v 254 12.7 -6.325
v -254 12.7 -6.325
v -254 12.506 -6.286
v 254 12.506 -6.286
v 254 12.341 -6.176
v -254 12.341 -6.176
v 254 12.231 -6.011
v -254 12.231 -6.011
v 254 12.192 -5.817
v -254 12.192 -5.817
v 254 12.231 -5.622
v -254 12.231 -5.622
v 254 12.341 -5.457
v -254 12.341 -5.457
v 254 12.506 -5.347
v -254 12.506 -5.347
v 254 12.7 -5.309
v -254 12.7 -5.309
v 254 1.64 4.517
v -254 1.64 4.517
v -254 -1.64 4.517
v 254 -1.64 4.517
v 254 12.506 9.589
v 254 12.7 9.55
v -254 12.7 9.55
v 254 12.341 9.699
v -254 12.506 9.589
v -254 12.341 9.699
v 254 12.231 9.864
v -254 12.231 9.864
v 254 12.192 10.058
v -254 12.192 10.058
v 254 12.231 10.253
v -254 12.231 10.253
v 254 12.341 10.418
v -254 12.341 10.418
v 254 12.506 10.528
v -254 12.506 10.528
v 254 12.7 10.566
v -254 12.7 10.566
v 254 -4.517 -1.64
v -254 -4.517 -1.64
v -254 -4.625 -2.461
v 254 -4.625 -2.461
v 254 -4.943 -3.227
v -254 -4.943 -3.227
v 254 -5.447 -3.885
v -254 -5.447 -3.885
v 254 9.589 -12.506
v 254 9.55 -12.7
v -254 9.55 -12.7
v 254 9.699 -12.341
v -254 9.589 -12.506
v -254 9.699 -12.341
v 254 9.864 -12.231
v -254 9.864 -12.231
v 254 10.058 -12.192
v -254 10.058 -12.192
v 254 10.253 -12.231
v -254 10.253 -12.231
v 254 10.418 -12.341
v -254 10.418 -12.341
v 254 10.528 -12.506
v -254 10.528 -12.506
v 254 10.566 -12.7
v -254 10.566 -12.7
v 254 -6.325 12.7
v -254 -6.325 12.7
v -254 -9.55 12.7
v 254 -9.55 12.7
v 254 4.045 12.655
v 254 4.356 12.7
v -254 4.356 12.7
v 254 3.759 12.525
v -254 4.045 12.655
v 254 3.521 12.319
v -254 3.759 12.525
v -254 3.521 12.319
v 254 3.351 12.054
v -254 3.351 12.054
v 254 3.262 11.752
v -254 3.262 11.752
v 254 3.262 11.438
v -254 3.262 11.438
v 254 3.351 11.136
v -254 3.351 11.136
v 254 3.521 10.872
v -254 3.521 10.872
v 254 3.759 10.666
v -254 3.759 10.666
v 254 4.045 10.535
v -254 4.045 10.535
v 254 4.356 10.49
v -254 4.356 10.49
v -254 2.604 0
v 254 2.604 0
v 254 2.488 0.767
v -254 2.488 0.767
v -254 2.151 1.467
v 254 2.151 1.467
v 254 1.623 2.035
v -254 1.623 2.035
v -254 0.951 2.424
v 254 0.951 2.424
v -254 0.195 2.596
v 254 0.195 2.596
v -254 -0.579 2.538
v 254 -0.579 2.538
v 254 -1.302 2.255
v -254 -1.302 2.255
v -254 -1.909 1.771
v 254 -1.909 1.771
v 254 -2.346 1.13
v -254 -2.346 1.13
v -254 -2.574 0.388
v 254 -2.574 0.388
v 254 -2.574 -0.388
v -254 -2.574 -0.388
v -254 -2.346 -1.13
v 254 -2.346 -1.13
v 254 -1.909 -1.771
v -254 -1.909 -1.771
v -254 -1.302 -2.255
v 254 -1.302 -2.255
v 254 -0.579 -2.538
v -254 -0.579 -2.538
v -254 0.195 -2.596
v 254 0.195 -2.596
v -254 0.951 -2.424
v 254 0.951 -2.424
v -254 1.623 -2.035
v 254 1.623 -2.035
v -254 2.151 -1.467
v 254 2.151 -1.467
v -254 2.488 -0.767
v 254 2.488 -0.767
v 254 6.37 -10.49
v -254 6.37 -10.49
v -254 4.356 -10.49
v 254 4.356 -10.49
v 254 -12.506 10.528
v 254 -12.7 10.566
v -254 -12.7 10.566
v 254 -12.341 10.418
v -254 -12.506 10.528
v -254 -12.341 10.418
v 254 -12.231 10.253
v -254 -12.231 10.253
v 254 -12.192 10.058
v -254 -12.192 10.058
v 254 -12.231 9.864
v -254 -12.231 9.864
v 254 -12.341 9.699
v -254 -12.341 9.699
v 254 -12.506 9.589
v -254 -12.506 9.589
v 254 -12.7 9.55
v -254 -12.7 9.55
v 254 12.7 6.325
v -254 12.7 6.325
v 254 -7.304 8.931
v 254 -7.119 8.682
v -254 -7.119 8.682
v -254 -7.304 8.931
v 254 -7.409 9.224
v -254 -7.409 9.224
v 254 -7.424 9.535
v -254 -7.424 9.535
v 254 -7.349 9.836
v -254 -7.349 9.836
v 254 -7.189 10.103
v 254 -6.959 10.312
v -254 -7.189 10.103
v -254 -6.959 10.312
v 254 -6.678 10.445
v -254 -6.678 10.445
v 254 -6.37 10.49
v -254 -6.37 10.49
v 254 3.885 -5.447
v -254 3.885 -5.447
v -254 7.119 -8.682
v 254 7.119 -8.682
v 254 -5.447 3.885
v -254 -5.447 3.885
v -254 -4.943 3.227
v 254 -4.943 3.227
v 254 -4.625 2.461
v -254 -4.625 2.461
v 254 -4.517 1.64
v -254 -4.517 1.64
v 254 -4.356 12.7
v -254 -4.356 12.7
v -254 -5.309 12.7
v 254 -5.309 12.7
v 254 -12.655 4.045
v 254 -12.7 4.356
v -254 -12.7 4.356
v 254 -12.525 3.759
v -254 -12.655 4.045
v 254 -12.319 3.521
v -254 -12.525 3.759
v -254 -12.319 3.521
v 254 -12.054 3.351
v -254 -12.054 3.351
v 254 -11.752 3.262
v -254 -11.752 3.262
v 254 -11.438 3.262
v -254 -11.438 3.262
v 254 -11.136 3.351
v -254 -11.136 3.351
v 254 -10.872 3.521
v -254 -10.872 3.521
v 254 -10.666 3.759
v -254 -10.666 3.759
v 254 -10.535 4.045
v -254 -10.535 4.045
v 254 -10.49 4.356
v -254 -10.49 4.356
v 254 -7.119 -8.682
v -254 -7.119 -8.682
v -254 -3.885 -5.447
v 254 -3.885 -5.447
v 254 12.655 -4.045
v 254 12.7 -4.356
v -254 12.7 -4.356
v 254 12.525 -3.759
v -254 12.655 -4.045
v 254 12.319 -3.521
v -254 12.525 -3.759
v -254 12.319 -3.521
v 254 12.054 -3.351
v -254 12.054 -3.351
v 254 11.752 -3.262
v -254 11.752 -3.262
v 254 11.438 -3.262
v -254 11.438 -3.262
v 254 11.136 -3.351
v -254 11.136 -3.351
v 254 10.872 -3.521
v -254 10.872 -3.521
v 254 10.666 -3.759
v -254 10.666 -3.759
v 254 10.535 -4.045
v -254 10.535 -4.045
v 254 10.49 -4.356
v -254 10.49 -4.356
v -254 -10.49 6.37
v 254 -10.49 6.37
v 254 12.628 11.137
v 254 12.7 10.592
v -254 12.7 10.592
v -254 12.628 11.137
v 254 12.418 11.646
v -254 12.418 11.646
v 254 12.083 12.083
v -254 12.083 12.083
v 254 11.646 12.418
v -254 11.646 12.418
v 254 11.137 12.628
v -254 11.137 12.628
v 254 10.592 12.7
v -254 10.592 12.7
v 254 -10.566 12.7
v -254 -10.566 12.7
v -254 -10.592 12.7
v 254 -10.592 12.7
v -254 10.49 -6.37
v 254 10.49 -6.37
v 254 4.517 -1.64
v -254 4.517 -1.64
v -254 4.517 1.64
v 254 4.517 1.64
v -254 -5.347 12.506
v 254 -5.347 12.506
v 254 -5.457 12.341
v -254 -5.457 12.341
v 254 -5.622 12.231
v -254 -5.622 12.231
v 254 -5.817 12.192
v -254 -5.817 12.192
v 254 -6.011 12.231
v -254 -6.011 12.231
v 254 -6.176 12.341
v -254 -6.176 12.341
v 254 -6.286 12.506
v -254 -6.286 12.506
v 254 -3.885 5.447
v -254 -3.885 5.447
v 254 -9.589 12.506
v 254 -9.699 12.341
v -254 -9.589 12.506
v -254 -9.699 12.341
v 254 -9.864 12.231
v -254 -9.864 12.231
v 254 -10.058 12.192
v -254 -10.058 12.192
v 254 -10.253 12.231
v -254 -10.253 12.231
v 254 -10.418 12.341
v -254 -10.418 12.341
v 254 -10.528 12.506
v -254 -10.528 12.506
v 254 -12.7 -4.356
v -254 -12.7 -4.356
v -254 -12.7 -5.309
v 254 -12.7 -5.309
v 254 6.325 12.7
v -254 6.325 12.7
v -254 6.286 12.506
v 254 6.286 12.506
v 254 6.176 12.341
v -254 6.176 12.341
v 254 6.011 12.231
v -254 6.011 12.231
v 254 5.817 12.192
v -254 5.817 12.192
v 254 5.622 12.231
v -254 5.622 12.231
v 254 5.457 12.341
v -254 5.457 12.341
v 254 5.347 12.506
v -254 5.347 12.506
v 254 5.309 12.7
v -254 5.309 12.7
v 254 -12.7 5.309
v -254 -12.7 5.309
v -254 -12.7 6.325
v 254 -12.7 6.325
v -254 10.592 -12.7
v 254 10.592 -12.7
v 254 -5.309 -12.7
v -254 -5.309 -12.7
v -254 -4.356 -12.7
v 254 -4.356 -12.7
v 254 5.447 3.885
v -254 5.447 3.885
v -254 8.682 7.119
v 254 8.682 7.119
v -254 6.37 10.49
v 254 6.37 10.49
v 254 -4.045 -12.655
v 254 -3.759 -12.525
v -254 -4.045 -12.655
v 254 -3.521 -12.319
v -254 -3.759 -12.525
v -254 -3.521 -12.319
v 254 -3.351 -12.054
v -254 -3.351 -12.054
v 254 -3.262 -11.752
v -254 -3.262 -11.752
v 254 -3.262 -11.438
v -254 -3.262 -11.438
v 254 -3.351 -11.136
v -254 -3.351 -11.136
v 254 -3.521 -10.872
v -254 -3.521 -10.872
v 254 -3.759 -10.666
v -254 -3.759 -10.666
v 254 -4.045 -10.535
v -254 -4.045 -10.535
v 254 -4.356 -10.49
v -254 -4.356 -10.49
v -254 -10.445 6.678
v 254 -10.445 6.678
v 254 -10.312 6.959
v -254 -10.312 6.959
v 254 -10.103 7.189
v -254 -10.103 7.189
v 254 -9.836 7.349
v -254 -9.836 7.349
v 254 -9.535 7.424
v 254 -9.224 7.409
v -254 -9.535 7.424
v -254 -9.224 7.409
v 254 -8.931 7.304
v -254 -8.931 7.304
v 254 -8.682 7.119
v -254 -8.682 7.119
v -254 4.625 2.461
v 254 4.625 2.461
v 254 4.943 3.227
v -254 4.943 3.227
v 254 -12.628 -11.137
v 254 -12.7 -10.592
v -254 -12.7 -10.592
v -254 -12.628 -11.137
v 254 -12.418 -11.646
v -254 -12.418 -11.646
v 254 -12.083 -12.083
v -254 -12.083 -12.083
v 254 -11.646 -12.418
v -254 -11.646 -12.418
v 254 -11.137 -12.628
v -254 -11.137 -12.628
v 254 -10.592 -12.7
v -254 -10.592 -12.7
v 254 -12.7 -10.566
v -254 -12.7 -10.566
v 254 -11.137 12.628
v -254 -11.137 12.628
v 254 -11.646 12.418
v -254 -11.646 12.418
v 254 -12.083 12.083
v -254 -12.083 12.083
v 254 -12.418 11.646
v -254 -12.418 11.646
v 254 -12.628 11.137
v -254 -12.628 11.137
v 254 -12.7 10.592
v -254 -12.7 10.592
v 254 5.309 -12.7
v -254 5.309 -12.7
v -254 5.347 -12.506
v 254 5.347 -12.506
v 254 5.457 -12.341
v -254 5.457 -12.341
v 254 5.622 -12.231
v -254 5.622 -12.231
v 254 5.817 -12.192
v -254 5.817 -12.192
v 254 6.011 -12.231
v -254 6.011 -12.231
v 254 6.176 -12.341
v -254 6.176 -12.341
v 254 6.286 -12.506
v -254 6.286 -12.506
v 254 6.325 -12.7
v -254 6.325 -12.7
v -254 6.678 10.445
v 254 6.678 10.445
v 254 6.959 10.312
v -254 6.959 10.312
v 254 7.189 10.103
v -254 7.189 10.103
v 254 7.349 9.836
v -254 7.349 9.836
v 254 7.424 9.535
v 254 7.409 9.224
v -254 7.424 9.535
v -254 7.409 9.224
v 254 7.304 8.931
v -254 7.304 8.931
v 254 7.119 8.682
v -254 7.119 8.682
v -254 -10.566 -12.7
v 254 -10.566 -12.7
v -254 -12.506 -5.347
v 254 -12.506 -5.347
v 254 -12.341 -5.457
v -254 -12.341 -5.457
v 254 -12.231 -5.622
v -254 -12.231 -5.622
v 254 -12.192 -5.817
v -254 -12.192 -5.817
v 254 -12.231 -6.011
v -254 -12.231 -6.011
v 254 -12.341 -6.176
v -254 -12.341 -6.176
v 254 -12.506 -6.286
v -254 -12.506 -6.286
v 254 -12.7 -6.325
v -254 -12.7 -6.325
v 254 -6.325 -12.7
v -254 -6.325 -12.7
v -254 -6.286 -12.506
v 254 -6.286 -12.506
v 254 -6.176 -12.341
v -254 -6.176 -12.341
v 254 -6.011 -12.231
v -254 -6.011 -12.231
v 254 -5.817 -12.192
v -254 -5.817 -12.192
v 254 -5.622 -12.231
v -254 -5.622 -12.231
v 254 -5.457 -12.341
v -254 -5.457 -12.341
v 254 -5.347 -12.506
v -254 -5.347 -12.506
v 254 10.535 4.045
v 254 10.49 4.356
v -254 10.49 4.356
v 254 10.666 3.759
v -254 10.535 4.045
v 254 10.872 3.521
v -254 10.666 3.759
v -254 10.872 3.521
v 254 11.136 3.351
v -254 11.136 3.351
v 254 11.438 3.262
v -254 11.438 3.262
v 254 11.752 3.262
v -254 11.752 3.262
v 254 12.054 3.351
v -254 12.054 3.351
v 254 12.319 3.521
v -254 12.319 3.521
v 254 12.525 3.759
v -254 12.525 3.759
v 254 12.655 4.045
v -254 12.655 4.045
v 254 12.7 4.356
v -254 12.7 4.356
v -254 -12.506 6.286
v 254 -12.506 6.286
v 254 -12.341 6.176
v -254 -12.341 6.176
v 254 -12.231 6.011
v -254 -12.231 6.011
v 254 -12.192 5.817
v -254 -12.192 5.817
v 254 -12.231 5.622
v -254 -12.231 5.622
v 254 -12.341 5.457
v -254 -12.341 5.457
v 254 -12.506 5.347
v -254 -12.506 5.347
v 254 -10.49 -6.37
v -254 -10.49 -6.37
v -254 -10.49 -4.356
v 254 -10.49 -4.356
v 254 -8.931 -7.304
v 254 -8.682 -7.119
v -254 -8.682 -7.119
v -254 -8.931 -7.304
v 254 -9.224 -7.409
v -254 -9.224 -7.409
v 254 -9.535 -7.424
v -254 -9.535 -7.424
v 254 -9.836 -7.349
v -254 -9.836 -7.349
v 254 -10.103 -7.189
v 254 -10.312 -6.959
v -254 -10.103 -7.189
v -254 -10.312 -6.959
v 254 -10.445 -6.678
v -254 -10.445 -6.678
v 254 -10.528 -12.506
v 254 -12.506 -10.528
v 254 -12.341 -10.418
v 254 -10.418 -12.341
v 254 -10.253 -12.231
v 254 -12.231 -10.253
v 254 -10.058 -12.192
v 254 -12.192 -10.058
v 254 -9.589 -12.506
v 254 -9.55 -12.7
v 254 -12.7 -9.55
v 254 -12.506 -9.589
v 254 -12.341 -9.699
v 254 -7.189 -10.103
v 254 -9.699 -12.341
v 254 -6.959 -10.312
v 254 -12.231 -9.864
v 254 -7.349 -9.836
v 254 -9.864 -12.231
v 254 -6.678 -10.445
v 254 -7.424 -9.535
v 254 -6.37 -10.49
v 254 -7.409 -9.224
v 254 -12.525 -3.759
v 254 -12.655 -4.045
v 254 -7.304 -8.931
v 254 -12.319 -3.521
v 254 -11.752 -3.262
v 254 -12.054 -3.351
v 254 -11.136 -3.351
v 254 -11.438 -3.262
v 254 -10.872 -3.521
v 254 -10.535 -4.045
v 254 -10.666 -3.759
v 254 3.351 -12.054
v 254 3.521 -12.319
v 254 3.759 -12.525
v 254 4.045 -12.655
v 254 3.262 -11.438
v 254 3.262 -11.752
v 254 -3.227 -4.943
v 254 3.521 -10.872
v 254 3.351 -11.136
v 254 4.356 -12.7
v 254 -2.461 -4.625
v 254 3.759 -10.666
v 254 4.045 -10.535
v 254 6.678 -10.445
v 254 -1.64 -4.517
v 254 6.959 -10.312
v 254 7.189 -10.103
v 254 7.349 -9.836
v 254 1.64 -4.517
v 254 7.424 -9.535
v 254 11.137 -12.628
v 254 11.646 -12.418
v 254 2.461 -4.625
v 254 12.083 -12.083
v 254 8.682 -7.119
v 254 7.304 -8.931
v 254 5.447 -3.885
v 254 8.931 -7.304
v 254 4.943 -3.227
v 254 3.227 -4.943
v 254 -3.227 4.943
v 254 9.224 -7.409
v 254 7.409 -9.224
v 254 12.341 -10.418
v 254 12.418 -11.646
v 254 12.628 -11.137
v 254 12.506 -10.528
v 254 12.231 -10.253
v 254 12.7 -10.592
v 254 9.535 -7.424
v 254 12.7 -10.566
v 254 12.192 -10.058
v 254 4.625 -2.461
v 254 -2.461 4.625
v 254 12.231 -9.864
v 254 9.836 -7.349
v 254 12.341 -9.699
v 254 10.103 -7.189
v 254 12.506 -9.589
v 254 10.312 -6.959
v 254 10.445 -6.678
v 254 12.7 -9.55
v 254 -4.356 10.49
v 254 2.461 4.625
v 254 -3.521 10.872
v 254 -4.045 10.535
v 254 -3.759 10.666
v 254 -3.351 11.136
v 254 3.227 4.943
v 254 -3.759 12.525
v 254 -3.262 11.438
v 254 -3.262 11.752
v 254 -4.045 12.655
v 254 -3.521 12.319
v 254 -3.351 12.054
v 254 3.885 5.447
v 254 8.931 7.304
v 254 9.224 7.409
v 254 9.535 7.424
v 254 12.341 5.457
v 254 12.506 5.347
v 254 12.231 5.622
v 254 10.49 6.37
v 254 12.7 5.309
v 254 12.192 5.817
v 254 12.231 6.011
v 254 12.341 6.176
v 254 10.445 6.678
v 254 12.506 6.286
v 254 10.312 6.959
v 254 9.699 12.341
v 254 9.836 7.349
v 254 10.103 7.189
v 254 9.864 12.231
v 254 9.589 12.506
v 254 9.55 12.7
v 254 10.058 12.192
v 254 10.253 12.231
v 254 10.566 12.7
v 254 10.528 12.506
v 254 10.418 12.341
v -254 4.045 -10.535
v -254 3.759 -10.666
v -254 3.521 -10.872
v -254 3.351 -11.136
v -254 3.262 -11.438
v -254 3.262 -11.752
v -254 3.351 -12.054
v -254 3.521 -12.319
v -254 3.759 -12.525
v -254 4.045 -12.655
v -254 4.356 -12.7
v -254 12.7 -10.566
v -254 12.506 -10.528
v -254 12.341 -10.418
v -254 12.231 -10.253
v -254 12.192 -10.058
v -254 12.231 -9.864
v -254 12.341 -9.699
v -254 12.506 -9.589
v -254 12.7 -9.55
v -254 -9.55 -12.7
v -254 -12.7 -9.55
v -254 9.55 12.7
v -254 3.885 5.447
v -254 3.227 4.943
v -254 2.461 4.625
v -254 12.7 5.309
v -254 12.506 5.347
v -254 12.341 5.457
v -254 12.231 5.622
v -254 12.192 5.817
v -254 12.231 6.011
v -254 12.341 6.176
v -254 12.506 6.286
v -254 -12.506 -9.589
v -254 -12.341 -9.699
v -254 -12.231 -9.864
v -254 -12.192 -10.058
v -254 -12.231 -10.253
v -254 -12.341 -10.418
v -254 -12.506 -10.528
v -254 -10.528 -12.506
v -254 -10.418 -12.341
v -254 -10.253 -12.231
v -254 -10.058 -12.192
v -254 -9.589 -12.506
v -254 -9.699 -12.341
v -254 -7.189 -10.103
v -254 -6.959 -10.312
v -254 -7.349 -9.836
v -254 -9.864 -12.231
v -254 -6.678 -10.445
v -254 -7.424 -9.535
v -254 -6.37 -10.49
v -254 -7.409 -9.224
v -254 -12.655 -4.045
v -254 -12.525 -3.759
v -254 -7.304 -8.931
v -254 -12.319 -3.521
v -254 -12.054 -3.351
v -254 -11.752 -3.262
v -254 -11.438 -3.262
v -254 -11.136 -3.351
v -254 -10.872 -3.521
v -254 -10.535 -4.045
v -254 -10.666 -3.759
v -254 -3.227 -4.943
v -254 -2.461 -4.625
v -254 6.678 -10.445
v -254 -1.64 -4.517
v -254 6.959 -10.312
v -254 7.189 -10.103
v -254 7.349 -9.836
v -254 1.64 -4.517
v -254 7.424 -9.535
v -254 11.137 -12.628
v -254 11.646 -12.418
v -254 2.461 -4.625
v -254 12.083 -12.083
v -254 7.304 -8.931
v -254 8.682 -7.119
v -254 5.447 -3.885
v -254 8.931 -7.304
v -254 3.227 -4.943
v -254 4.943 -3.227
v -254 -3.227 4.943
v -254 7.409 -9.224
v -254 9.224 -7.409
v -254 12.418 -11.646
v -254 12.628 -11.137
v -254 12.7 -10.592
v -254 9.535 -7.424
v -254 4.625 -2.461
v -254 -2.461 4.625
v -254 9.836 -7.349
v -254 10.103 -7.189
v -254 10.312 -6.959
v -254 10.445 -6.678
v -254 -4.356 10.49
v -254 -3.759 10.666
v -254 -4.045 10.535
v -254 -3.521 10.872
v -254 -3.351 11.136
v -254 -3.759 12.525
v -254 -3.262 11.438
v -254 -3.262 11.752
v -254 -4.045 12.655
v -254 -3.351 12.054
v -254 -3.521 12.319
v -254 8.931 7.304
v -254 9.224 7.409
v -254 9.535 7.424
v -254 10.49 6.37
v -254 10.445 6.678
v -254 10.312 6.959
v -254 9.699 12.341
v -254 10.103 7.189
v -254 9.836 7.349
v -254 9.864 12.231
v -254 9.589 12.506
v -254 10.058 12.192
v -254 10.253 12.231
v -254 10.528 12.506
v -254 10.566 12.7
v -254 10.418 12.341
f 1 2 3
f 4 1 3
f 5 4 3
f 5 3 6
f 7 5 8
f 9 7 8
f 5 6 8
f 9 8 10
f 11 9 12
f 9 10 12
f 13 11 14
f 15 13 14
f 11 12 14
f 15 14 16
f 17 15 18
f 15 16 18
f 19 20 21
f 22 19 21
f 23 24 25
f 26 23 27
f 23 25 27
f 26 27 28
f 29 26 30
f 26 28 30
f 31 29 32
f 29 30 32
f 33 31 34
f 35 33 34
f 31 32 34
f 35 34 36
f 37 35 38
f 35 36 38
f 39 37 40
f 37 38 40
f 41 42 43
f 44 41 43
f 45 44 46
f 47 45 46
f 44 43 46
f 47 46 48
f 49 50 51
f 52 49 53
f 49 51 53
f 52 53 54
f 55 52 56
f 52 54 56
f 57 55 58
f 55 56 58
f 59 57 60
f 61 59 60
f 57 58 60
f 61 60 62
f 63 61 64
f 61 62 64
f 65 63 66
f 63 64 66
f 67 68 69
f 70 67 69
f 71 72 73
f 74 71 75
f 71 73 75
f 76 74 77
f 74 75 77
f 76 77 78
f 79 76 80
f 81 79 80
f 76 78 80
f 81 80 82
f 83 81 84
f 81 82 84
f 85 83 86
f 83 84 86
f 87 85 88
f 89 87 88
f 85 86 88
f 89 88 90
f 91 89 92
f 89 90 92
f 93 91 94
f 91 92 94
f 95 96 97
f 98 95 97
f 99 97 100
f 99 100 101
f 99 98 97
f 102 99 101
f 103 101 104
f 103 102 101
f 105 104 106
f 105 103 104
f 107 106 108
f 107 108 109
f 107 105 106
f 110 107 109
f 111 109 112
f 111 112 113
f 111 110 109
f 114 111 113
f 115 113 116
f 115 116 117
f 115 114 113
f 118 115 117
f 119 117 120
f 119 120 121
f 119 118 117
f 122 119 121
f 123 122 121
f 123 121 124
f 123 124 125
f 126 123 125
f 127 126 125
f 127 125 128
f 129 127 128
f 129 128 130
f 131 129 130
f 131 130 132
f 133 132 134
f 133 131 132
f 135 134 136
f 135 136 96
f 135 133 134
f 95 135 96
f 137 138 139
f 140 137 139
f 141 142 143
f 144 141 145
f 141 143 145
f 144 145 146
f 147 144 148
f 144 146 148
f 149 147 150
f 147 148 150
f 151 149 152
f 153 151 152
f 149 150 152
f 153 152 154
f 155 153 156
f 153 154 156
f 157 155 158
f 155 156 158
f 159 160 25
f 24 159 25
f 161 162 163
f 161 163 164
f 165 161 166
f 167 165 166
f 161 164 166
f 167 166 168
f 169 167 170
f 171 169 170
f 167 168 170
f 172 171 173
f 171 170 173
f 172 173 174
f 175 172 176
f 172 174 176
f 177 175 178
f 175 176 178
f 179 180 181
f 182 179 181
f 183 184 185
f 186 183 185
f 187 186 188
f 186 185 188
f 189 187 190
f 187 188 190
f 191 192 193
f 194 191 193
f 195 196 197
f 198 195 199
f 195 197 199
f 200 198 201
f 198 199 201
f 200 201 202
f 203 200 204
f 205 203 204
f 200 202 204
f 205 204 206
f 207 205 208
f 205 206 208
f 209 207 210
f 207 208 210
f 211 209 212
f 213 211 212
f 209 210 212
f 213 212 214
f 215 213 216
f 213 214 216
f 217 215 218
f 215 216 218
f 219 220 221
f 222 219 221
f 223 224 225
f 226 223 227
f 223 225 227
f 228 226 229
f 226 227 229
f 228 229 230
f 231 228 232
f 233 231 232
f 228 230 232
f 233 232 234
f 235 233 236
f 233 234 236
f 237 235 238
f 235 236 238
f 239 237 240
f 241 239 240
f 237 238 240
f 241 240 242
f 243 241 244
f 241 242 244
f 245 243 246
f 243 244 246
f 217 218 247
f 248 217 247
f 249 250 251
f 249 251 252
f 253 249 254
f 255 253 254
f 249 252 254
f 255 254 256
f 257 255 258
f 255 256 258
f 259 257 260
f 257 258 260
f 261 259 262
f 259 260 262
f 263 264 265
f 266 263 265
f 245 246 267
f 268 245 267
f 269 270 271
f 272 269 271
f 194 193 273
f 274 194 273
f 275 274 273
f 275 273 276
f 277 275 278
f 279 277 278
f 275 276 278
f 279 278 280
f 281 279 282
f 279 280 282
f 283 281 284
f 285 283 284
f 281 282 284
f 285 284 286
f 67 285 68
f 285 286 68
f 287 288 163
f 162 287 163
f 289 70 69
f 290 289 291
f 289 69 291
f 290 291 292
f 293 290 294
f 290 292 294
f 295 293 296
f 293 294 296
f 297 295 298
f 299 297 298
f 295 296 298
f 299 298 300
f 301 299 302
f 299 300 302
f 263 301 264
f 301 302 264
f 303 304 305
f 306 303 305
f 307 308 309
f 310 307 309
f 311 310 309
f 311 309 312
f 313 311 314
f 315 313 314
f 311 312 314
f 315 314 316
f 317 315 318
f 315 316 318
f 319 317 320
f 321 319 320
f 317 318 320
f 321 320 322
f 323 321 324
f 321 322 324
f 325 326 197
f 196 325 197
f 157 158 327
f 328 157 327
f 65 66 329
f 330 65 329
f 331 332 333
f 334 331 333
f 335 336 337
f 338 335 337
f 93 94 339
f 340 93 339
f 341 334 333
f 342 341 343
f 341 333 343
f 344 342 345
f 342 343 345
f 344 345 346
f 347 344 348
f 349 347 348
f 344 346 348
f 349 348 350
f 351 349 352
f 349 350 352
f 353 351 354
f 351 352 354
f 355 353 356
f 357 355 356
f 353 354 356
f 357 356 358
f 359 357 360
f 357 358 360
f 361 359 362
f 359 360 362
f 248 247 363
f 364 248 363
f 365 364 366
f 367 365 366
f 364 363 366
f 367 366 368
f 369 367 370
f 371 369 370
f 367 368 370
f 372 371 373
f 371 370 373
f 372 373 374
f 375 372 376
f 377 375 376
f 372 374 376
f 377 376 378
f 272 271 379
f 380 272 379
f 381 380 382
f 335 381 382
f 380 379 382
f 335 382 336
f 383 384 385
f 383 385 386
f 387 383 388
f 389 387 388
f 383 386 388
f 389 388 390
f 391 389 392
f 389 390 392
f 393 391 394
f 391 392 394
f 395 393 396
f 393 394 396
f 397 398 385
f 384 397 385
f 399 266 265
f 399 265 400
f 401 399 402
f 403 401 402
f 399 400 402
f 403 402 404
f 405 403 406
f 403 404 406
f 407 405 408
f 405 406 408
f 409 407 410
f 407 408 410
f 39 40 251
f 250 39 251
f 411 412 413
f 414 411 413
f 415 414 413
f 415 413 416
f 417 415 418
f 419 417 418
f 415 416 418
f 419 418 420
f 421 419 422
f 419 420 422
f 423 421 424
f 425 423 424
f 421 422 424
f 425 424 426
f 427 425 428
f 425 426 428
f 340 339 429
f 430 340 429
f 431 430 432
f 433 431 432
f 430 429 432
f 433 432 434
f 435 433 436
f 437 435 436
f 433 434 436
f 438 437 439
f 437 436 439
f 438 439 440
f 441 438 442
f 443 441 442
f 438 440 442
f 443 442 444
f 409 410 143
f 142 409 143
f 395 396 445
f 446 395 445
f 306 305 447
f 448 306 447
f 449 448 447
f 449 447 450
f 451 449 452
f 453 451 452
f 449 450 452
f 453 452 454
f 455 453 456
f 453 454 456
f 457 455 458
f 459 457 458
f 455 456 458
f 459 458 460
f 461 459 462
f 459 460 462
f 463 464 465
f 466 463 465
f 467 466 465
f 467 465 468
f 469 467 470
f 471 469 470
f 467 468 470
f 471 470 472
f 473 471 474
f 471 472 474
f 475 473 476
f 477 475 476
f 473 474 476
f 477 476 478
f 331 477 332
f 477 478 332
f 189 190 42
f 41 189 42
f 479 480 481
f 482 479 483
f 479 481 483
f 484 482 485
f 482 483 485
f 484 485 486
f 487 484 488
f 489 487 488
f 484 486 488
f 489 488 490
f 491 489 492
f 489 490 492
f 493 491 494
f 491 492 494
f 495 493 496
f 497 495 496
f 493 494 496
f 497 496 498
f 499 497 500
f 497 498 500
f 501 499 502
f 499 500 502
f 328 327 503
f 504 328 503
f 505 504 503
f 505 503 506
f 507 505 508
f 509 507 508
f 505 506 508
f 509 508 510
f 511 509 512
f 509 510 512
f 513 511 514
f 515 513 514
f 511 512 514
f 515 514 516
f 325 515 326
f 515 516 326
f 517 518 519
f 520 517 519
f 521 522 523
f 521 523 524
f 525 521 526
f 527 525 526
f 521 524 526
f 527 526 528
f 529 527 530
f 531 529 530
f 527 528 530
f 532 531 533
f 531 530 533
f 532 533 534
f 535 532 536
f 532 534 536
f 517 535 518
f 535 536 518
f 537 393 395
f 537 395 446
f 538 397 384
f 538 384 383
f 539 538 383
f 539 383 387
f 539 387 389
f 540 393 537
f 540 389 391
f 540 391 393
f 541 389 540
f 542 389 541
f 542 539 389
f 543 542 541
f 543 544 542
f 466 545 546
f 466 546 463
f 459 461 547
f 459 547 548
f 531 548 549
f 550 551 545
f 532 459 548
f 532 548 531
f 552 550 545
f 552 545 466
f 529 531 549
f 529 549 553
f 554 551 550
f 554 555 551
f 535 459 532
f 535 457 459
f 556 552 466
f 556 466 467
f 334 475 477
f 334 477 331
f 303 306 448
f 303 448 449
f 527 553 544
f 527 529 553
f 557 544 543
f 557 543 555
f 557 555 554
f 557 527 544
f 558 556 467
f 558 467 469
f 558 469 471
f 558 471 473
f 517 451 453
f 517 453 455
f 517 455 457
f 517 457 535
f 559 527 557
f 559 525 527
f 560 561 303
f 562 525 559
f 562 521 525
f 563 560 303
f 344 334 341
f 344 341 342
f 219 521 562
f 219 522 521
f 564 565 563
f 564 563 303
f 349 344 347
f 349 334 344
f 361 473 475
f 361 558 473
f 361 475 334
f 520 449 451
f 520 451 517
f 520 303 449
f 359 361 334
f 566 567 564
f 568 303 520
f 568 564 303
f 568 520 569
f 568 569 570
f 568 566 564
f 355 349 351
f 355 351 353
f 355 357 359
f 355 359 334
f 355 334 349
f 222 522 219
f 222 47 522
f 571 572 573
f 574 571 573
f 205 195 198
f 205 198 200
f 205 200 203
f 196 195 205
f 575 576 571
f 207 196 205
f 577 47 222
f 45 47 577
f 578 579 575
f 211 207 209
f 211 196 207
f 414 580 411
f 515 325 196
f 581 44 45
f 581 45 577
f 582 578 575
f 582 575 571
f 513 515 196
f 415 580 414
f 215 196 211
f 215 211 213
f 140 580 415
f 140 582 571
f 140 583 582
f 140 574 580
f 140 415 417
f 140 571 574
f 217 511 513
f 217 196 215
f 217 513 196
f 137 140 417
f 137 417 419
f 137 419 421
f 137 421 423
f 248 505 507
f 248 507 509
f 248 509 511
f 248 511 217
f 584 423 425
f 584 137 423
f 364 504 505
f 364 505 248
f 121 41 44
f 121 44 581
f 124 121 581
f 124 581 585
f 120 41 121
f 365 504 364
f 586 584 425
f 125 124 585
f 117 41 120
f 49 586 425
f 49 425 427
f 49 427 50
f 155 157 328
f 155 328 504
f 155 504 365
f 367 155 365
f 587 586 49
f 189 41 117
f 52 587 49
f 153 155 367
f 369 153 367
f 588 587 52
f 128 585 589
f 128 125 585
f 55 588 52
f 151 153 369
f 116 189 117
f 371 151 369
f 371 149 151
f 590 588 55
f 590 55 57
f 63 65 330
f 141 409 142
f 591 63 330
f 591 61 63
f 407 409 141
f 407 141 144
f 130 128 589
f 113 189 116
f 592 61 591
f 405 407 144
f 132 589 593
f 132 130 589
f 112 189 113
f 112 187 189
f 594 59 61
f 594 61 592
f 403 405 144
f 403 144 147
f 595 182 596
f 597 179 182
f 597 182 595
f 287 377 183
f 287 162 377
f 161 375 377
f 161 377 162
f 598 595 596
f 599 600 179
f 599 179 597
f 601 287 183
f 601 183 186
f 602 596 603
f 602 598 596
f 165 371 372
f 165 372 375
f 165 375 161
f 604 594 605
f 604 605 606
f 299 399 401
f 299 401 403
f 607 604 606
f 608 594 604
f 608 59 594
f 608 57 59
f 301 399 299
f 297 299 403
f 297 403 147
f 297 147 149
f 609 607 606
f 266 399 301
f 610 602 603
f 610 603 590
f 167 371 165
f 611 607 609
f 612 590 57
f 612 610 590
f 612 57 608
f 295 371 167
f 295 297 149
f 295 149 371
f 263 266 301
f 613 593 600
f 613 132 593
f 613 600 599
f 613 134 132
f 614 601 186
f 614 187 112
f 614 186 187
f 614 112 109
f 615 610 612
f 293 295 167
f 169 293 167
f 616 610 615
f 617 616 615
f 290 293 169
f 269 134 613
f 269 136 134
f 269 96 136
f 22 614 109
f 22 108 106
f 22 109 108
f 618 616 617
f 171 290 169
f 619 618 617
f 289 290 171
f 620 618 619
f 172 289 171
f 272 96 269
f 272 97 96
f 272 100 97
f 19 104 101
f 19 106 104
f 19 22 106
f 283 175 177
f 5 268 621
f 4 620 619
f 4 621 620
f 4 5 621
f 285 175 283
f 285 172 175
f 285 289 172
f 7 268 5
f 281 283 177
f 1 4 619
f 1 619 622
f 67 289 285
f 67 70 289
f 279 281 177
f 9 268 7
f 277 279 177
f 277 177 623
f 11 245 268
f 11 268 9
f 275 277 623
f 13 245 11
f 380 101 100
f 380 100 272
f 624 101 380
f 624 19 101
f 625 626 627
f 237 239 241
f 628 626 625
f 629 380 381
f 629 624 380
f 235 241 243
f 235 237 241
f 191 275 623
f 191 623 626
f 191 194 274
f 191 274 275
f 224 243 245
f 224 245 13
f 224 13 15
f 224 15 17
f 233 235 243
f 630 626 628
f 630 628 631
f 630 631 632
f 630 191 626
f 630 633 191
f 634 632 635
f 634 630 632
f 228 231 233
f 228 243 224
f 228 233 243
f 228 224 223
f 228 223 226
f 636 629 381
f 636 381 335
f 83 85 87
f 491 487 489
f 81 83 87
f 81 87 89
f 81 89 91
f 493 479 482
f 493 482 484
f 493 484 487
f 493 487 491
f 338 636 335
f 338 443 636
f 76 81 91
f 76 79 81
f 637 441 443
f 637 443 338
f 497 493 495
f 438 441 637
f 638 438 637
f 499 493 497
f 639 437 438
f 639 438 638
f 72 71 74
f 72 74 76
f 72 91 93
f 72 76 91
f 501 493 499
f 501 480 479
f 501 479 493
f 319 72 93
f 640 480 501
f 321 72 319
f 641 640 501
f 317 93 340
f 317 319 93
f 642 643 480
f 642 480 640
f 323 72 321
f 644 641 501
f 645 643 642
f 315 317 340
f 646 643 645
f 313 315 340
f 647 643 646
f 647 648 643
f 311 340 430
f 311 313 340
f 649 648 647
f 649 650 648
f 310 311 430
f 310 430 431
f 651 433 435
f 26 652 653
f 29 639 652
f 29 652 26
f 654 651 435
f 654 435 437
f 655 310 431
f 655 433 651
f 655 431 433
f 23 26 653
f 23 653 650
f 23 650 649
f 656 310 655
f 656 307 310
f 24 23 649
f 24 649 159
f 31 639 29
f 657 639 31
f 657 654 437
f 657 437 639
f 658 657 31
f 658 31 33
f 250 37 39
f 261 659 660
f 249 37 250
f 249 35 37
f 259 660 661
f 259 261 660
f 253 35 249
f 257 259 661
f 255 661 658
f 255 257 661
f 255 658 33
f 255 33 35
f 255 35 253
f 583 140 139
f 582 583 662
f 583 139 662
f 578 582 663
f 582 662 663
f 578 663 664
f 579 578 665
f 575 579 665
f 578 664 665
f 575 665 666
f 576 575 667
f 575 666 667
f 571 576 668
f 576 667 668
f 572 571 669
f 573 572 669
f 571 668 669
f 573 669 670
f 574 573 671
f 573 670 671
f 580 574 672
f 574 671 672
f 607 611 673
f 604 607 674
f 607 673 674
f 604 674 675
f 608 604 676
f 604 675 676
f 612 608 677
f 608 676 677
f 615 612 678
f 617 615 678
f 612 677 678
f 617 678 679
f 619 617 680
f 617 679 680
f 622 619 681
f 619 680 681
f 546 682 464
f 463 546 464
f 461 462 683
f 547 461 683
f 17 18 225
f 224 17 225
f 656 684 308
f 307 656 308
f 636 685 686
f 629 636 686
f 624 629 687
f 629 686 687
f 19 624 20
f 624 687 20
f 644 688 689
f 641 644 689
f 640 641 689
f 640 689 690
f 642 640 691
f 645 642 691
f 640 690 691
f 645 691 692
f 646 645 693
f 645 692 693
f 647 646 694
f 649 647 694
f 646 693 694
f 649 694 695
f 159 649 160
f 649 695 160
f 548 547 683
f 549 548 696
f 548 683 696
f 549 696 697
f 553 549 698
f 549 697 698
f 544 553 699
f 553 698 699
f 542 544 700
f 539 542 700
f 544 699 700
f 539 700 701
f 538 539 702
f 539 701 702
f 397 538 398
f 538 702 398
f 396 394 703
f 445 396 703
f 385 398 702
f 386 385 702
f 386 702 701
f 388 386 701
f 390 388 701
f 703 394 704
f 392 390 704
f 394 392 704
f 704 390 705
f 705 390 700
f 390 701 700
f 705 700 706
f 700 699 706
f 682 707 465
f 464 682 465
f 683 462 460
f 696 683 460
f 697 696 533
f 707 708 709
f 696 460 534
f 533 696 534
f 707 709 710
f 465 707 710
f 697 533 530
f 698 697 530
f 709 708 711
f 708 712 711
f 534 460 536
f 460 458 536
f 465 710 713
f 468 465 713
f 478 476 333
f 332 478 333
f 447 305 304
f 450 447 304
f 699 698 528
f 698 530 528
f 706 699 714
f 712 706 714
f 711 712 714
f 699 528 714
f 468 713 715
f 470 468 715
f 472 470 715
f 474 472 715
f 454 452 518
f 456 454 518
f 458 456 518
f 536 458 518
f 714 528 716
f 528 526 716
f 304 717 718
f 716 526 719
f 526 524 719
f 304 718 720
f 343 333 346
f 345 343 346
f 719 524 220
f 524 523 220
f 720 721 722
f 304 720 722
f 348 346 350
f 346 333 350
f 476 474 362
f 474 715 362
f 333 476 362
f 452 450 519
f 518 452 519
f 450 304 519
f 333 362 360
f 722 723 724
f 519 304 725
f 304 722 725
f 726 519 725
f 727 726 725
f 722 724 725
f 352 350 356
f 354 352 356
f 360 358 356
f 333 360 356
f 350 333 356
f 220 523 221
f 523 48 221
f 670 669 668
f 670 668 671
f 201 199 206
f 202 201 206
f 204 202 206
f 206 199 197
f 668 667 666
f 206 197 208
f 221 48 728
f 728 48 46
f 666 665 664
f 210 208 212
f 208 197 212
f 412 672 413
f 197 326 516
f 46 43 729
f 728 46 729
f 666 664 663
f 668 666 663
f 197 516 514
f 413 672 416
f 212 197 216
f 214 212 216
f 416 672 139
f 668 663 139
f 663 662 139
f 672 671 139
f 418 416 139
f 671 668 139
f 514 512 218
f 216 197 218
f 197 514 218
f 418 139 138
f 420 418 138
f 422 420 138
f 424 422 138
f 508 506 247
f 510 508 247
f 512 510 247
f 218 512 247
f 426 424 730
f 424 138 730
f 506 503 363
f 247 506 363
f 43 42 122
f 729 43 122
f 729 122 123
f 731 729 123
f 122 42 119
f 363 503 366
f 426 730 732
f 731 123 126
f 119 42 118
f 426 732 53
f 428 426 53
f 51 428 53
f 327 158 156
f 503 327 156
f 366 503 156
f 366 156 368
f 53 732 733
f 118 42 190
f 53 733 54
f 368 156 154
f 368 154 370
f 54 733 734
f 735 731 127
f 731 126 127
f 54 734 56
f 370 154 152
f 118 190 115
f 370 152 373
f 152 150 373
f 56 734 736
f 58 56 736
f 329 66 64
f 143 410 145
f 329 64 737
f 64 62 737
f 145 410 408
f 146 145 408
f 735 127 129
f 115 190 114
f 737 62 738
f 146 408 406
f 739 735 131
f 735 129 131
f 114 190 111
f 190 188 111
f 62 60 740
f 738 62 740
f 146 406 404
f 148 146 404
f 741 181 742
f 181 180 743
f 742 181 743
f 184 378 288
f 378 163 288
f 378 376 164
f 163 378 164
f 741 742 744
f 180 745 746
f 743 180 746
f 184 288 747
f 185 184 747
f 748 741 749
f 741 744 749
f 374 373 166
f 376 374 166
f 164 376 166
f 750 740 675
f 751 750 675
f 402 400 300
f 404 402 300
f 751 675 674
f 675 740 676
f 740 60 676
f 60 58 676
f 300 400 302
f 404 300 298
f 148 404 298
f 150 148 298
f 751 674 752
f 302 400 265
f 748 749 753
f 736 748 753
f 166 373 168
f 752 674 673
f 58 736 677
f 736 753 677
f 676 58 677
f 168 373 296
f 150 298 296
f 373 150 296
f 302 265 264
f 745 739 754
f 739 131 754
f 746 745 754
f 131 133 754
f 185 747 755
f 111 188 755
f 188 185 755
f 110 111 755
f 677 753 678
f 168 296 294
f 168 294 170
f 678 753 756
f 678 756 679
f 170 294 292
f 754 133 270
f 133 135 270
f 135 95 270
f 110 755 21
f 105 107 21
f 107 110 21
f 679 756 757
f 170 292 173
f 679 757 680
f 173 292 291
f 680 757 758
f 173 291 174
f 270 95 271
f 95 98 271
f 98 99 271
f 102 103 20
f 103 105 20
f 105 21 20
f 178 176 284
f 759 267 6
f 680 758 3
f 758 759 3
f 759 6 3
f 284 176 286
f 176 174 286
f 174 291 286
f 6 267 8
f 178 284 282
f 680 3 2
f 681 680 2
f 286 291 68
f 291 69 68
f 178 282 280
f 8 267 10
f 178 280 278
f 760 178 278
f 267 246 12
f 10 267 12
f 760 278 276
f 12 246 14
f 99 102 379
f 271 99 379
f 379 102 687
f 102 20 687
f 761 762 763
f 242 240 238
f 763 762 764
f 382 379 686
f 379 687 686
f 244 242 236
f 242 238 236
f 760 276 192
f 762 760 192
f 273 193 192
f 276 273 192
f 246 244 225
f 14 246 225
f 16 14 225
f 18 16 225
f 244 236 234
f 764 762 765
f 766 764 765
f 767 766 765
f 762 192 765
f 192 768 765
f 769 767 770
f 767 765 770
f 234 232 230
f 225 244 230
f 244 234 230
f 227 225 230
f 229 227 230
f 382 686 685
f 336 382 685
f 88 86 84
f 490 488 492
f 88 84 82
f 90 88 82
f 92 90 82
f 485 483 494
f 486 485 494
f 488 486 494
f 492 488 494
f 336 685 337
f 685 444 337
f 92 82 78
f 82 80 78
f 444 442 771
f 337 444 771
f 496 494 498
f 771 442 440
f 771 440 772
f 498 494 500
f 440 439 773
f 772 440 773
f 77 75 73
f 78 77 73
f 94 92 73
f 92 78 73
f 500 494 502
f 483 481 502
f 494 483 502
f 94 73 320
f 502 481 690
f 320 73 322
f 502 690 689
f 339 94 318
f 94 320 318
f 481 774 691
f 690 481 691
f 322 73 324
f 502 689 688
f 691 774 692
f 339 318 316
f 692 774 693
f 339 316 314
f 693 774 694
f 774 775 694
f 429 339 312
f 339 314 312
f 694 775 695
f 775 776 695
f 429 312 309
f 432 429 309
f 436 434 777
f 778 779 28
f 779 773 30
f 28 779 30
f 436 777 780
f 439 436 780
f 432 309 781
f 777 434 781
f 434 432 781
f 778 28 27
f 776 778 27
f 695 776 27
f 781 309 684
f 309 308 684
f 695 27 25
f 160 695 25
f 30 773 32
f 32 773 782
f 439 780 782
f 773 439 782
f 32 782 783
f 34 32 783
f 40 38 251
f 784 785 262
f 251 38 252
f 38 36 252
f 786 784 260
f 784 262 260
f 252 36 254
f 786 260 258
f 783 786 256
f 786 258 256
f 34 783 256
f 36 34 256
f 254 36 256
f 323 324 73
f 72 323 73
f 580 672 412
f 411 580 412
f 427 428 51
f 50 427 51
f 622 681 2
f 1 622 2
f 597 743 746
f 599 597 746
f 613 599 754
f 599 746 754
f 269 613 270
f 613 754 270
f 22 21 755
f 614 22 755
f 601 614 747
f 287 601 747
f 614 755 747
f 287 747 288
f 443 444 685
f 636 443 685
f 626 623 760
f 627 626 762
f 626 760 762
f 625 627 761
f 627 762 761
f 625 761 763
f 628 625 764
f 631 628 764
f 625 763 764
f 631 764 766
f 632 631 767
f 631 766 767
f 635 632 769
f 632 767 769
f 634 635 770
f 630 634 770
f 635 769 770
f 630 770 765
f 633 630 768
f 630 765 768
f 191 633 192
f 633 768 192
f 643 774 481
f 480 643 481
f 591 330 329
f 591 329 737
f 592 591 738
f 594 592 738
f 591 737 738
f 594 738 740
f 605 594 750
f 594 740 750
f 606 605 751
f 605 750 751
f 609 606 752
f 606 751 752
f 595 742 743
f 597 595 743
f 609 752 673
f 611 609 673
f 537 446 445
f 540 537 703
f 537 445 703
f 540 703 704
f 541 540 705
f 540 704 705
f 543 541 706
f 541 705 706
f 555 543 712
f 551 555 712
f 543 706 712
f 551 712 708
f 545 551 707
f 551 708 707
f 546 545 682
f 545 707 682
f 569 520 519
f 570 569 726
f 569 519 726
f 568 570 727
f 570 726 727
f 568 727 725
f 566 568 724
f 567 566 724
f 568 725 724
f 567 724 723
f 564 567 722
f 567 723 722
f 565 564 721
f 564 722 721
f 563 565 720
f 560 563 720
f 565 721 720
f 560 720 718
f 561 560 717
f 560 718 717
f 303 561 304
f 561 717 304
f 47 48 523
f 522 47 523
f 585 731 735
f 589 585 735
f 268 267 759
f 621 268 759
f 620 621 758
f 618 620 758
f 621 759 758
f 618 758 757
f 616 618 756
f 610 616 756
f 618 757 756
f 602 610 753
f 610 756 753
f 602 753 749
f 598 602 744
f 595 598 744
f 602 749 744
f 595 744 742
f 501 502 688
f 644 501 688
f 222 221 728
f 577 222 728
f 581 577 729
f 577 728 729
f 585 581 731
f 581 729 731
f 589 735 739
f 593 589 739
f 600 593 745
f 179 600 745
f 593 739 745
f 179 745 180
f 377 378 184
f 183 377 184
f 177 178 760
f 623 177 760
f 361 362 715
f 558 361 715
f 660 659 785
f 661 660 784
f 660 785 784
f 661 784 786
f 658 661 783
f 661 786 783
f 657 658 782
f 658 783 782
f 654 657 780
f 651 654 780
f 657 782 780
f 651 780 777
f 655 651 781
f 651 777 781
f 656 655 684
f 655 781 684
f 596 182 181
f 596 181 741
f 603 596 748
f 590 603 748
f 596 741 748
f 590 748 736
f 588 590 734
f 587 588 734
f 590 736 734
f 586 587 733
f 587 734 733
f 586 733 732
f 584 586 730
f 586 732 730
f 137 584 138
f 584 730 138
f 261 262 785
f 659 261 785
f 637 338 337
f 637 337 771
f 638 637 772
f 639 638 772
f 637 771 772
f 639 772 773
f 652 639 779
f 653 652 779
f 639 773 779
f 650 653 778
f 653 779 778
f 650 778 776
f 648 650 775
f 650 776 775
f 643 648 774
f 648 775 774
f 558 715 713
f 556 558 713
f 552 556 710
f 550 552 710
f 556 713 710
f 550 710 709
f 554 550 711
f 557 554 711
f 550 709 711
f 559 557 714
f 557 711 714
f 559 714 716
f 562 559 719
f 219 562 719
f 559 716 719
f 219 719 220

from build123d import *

# Parameters (mm, degrees)
SKETCH11_R              = 2.6035
FRACTIONAL_1010_1_DEPTH = 508


with BuildPart() as part:
    # Sketch11 → Fractional 1010(1) (new body)
    with BuildSketch(Plane.YZ.offset(-254)):
        with BuildLine():
            Line((10.5918, 12.7), (10.5664, 12.7))
            ThreePointArc((10.5664, 12.7), (10.0584, 12.192), (9.5504, 12.7))
            Line((9.5504, 12.7), (6.3246, 12.7))
            ThreePointArc((6.3246, 12.7), (5.8166, 12.192), (5.3086, 12.7))
            Line((5.3086, 12.7), (4.3561, 12.7))
            ThreePointArc((4.3561, 12.7), (3.2512, 11.5951), (4.3561, 10.4902))
            Line((4.3561, 10.4902), (6.370083786, 10.4902))
            ThreePointArc((6.370083786, 10.4902), (7.348856743, 9.836204819), (7.119204175, 8.681663397))
            Line((7.119204175, 8.681663397), (3.88464389, 5.447103113))
            ThreePointArc((3.88464389, 5.447103113), (2.854599758, 4.758849627), (1.63957986, 4.517167143))
            Line((1.63957986, 4.517167143), (-1.63957986, 4.517167143))
            ThreePointArc((-1.63957986, 4.517167143), (-2.854599758, 4.758849627), (-3.88464389, 5.447103113))
            Line((-3.88464389, 5.447103113), (-7.119204175, 8.681663397))
            ThreePointArc((-7.119204175, 8.681663397), (-7.348856743, 9.836204819), (-6.370083786, 10.4902))
            Line((-6.370083786, 10.4902), (-4.3561, 10.4902))
            ThreePointArc((-4.3561, 10.4902), (-3.2512, 11.5951), (-4.3561, 12.7))
            Line((-4.3561, 12.7), (-5.3086, 12.7))
            ThreePointArc((-5.3086, 12.7), (-5.8166, 12.192), (-6.3246, 12.7))
            Line((-6.3246, 12.7), (-9.5504, 12.7))
            ThreePointArc((-9.5504, 12.7), (-10.0584, 12.192), (-10.5664, 12.7))
            Line((-10.5664, 12.7), (-10.5918, 12.7))
            ThreePointArc((-10.5918, 12.7), (-12.082522516, 12.082522516), (-12.7, 10.5918))
            Line((-12.7, 10.5918), (-12.7, 10.5664))
            ThreePointArc((-12.7, 10.5664), (-12.192, 10.0584), (-12.7, 9.5504))
            Line((-12.7, 9.5504), (-12.7, 6.3246))
            ThreePointArc((-12.7, 6.3246), (-12.192, 5.8166), (-12.7, 5.3086))
            Line((-12.7, 5.3086), (-12.7, 4.3561))
            ThreePointArc((-12.7, 4.3561), (-11.5951, 3.2512), (-10.4902, 4.3561))
            Line((-10.4902, 4.3561), (-10.4902, 6.370083786))
            ThreePointArc((-10.4902, 6.370083786), (-9.836204819, 7.348856743), (-8.681663397, 7.119204175))
            Line((-8.681663397, 7.119204175), (-5.447103113, 3.88464389))
            ThreePointArc((-5.447103113, 3.88464389), (-4.758849627, 2.854599758), (-4.517167143, 1.63957986))
            Line((-4.517167143, 1.63957986), (-4.517167143, -1.63957986))
            ThreePointArc((-4.517167143, -1.63957986), (-4.758849627, -2.854599758), (-5.447103113, -3.88464389))
            Line((-5.447103113, -3.88464389), (-8.681663397, -7.119204175))
            ThreePointArc((-8.681663397, -7.119204175), (-9.836204819, -7.348856743), (-10.4902, -6.370083786))
            Line((-10.4902, -6.370083786), (-10.4902, -4.3561))
            ThreePointArc((-10.4902, -4.3561), (-11.5951, -3.2512), (-12.7, -4.3561))
            Line((-12.7, -4.3561), (-12.7, -5.3086))
            ThreePointArc((-12.7, -5.3086), (-12.192, -5.8166), (-12.7, -6.3246))
            Line((-12.7, -6.3246), (-12.7, -9.5504))
            ThreePointArc((-12.7, -9.5504), (-12.192, -10.0584), (-12.7, -10.5664))
            Line((-12.7, -10.5664), (-12.7, -10.5918))
            ThreePointArc((-12.7, -10.5918), (-12.082522516, -12.082522516), (-10.5918, -12.7))
            Line((-10.5918, -12.7), (-10.5664, -12.7))
            ThreePointArc((-10.5664, -12.7), (-10.0584, -12.192), (-9.5504, -12.7))
            Line((-9.5504, -12.7), (-6.3246, -12.7))
            ThreePointArc((-6.3246, -12.7), (-5.8166, -12.192), (-5.3086, -12.7))
            Line((-5.3086, -12.7), (-4.3561, -12.7))
            ThreePointArc((-4.3561, -12.7), (-3.2512, -11.5951), (-4.3561, -10.4902))
            Line((-4.3561, -10.4902), (-6.370083786, -10.4902))
            ThreePointArc((-6.370083786, -10.4902), (-7.348856743, -9.836204819), (-7.119204175, -8.681663397))
            Line((-7.119204175, -8.681663397), (-3.88464389, -5.447103113))
            ThreePointArc((-3.88464389, -5.447103113), (-2.854599758, -4.758849627), (-1.63957986, -4.517167143))
            Line((-1.63957986, -4.517167143), (1.63957986, -4.517167143))
            ThreePointArc((1.63957986, -4.517167143), (2.854599758, -4.758849627), (3.88464389, -5.447103113))
            Line((3.88464389, -5.447103113), (7.119204175, -8.681663397))
            ThreePointArc((7.119204175, -8.681663397), (7.348856743, -9.836204819), (6.370083786, -10.4902))
            Line((6.370083786, -10.4902), (4.3561, -10.4902))
            ThreePointArc((4.3561, -10.4902), (3.2512, -11.5951), (4.3561, -12.7))
            Line((4.3561, -12.7), (5.3086, -12.7))
            ThreePointArc((5.3086, -12.7), (5.8166, -12.192), (6.3246, -12.7))
            Line((6.3246, -12.7), (9.5504, -12.7))
            ThreePointArc((9.5504, -12.7), (10.0584, -12.192), (10.5664, -12.7))
            Line((10.5664, -12.7), (10.5918, -12.7))
            ThreePointArc((10.5918, -12.7), (12.082522516, -12.082522516), (12.7, -10.5918))
            Line((12.7, -10.5918), (12.7, -10.5664))
            ThreePointArc((12.7, -10.5664), (12.192, -10.0584), (12.7, -9.5504))
            Line((12.7, -9.5504), (12.7, -6.3246))
            ThreePointArc((12.7, -6.3246), (12.192, -5.8166), (12.7, -5.3086))
            Line((12.7, -5.3086), (12.7, -4.3561))
            ThreePointArc((12.7, -4.3561), (11.5951, -3.2512), (10.4902, -4.3561))
            Line((10.4902, -4.3561), (10.4902, -6.370083786))
            ThreePointArc((10.4902, -6.370083786), (9.836204819, -7.348856743), (8.681663397, -7.119204175))
            Line((8.681663397, -7.119204175), (5.447103113, -3.88464389))
            ThreePointArc((5.447103113, -3.88464389), (4.758849627, -2.854599758), (4.517167143, -1.63957986))
            Line((4.517167143, -1.63957986), (4.517167143, 1.63957986))
            ThreePointArc((4.517167143, 1.63957986), (4.758849627, 2.854599758), (5.447103113, 3.88464389))
            Line((5.447103113, 3.88464389), (8.681663397, 7.119204175))
            ThreePointArc((8.681663397, 7.119204175), (9.836204819, 7.348856743), (10.4902, 6.370083786))
            Line((10.4902, 6.370083786), (10.4902, 4.3561))
            ThreePointArc((10.4902, 4.3561), (11.5951, 3.2512), (12.7, 4.3561))
            Line((12.7, 4.3561), (12.7, 5.3086))
            ThreePointArc((12.7, 5.3086), (12.192, 5.8166), (12.7, 6.3246))
            Line((12.7, 6.3246), (12.7, 9.5504))
            ThreePointArc((12.7, 9.5504), (12.192, 10.0584), (12.7, 10.5664))
            Line((12.7, 10.5664), (12.7, 10.5918))
            ThreePointArc((12.7, 10.5918), (12.082522516, 12.082522516), (10.5918, 12.7))
        make_face()
        Circle(SKETCH11_R, mode=Mode.SUBTRACT)
    extrude(amount=FRACTIONAL_1010_1_DEPTH)


solid = part.part
